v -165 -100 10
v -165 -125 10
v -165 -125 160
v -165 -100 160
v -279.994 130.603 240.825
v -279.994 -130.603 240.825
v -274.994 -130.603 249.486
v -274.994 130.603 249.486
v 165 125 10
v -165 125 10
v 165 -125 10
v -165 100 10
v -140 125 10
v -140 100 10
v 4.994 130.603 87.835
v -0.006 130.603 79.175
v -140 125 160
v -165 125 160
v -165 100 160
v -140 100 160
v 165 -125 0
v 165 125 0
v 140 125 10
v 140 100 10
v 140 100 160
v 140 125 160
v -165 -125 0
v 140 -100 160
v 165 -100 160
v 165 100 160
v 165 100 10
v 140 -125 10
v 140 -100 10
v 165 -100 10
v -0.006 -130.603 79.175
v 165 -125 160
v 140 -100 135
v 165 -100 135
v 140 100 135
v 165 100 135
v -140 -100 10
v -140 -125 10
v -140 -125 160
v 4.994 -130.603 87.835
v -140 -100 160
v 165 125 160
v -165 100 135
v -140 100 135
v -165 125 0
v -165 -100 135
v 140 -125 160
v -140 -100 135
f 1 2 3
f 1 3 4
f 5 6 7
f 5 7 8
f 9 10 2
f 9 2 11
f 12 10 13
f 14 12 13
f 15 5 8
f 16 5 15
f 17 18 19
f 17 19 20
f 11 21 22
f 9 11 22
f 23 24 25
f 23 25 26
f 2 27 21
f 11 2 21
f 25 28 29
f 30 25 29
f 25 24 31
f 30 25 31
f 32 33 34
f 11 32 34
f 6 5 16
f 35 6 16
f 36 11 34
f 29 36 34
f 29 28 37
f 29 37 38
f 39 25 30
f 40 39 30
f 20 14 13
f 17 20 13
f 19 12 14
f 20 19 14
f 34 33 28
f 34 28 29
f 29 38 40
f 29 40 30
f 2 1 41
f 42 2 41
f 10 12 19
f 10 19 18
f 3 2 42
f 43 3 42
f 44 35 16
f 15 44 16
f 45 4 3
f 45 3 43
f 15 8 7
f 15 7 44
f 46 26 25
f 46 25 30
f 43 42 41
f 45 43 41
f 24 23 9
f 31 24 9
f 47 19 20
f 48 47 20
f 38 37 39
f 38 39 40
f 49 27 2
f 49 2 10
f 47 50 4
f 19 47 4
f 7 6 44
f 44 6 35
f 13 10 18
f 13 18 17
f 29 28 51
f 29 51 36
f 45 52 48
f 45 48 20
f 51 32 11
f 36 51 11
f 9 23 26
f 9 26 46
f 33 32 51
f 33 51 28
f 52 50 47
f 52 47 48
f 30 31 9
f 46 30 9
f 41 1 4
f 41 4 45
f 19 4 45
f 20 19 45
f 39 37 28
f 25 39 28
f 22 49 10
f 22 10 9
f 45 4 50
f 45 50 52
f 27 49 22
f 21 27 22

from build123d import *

# Parameters (mm, degrees)
F0_W      = 330
F0_H      = 250
F1_DEPTH  = 10
F2_W      = 25
F2_H      = 25
F3_DEPTH  = 150
F4_W      = 25
F4_H      = 25
F5_DEPTH  = 200
F6_W      = 25
F6_H      = 25
F7_DEPTH  = 200
F10_W     = 323.301615
F10_H     = 261.20604
F11_DEPTH = 10


with BuildPart() as f1:
    # F0 (on Top) → F1 (new body)
    with BuildSketch(Plane.XY):
        Rectangle(F0_W, F0_H)
    extrude(amount=F1_DEPTH)


with BuildPart() as f3:
    # F2 (on face) → F3 (new body)
    with BuildSketch(Plane.XY.offset(10)):
        with Locations((152.5, 112.5)):
            Rectangle(F2_W, F2_H)
        with Locations((-152.5, -112.5)):
            Rectangle(F2_W, F2_H)
        with Locations((152.5, -112.5)):
            Rectangle(F2_W, F2_H)
        with Locations((-152.5, 112.5)):
            Rectangle(F2_W, F2_H)
    extrude(amount=F3_DEPTH)


with BuildPart() as f5:
    # F4 (on face) → F5 (new body)
    with BuildSketch(Plane.XZ.offset(-100)):
        with Locations((152.5, 147.5)):
            Rectangle(F4_W, F4_H)
    extrude(amount=F5_DEPTH)


with BuildPart() as f7:
    # F6 (on face) → F7 (new body)
    with BuildSketch(Plane.XZ.offset(-100)):
        with Locations((-152.5, 147.5)):
            Rectangle(F6_W, F6_H)
    extrude(amount=F7_DEPTH)


with BuildPart() as f11:
    # F10 (on face) → F11 (new body)
    with BuildSketch(Plane(origin=(34.282032, 0, 59.378222), x_dir=(0.866025, 0, -0.5), z_dir=(0.5, 0, 0.866025))):
        with Locations((-201.243594, 0)):
            Rectangle(F10_W, F10_H)
    extrude(amount=F11_DEPTH)


solid = Compound([f1.part, f3.part, f5.part, f7.part, f11.part])
